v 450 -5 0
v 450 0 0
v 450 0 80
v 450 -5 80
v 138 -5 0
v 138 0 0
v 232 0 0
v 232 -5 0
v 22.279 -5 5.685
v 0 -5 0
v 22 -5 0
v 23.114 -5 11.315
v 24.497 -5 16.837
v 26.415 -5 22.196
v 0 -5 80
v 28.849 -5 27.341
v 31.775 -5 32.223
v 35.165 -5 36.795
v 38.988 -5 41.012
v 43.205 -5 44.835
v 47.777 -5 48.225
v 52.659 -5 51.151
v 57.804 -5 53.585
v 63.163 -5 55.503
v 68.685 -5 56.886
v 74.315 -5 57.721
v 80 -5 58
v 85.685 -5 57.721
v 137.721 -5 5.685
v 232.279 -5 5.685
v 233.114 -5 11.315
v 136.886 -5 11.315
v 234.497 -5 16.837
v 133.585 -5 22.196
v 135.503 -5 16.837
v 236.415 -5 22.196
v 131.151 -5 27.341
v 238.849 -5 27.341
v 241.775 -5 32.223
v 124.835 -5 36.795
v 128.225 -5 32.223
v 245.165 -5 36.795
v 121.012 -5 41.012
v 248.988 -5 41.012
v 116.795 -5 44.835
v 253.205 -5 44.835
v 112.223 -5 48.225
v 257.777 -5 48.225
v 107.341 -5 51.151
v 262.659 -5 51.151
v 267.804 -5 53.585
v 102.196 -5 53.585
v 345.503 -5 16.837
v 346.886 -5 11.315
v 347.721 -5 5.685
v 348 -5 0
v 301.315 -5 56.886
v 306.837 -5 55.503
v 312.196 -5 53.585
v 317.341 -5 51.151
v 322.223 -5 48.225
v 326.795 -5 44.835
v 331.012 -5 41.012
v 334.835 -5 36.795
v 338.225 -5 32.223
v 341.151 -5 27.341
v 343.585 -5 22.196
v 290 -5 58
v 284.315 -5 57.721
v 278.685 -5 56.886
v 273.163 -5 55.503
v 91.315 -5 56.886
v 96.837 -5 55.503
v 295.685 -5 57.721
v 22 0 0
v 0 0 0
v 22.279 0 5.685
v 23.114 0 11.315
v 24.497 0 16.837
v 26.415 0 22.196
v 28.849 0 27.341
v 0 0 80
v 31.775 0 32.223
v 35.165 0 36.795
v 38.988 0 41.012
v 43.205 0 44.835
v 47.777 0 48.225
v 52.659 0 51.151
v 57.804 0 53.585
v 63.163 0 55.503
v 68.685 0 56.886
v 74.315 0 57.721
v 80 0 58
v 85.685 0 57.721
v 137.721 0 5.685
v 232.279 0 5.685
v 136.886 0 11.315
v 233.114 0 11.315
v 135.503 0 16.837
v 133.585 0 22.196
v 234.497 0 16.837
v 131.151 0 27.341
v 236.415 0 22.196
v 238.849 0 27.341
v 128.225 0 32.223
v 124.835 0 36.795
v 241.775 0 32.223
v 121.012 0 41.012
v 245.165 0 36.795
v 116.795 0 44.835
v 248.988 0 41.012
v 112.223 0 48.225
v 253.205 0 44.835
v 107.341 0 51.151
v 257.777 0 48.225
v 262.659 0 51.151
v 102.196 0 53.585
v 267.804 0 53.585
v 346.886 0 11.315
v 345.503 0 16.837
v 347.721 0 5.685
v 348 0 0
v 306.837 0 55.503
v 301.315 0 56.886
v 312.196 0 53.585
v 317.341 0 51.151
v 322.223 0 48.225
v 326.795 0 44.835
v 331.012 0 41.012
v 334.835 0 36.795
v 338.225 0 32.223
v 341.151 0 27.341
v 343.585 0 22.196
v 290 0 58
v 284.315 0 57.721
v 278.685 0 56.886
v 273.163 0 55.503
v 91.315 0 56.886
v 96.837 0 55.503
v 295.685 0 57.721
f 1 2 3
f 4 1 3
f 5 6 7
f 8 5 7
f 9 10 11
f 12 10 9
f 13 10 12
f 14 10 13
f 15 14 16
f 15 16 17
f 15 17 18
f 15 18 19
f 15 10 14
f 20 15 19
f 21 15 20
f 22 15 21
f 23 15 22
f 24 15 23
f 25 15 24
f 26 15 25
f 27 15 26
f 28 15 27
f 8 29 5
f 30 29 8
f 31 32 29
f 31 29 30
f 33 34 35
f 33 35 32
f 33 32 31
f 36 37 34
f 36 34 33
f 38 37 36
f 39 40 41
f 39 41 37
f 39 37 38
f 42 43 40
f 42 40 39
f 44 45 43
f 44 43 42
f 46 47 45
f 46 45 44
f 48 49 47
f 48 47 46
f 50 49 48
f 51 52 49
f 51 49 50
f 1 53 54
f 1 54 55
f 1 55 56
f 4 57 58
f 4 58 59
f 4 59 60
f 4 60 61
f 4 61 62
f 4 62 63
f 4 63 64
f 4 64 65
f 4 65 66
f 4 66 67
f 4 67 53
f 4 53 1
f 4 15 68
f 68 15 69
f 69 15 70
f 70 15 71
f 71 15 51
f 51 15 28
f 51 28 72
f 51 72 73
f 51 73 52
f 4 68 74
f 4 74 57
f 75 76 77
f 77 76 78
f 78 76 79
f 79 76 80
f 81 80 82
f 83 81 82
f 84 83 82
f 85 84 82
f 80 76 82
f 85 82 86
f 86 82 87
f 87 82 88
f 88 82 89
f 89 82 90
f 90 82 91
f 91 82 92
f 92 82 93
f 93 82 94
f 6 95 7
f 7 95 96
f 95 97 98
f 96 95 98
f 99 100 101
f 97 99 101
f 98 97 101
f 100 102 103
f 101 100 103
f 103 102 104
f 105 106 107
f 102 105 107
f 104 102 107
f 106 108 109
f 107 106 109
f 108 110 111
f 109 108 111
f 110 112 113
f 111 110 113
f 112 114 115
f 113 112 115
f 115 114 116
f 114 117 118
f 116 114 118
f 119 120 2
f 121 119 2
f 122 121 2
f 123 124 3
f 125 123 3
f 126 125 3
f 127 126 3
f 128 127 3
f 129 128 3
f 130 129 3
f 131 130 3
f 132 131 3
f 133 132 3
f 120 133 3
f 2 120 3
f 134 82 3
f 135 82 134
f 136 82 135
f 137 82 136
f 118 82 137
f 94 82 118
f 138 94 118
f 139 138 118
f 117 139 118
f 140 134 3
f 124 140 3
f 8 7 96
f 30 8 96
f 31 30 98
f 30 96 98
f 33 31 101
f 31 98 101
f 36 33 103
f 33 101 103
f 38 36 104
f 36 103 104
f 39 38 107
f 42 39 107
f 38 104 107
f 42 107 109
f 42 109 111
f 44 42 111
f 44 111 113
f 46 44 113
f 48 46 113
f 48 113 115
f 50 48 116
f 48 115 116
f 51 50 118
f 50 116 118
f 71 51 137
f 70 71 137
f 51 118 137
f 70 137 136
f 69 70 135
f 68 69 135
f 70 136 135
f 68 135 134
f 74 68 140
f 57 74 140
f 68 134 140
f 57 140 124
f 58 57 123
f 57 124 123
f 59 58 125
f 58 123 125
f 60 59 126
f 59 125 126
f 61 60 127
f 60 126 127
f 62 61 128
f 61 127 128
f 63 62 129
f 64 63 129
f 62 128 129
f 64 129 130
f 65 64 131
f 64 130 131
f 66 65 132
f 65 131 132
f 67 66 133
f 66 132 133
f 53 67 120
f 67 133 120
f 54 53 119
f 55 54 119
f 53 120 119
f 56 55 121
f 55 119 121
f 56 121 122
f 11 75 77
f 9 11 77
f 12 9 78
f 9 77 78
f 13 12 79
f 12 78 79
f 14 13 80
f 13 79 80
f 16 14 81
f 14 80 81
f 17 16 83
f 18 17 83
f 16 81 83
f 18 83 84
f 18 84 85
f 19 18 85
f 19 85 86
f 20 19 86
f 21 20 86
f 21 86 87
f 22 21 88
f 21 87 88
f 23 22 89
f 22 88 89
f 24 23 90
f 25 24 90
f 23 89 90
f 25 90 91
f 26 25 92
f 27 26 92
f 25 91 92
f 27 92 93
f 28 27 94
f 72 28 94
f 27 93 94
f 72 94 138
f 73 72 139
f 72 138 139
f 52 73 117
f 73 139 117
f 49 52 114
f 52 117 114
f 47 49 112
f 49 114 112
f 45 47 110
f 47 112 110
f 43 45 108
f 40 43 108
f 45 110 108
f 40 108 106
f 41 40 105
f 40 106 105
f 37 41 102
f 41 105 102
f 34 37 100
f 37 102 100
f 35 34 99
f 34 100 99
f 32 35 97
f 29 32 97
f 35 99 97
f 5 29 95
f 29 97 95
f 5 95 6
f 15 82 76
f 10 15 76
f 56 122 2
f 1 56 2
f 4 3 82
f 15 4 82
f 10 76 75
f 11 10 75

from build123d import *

# Parameters (mm, degrees)
F1_DEPTH = 5


with BuildPart() as f1:
    # F0 (on Front) → F1 (new body)
    with BuildSketch(Plane.XZ):
        with BuildLine():
            Line((0, 80), (0, 0))
            Line((0, 0), (22, 0))
            ThreePointArc((22, 0), (80, 58), (138, 0))
            Line((138, 0), (232, 0))
            ThreePointArc((232, 0), (290, 58), (348, 0))
            Line((348, 0), (450, 0))
            Line((450, 0), (450, 80))
            Line((450, 80), (0, 80))
        make_face()
    extrude(amount=F1_DEPTH)


solid = f1.part
